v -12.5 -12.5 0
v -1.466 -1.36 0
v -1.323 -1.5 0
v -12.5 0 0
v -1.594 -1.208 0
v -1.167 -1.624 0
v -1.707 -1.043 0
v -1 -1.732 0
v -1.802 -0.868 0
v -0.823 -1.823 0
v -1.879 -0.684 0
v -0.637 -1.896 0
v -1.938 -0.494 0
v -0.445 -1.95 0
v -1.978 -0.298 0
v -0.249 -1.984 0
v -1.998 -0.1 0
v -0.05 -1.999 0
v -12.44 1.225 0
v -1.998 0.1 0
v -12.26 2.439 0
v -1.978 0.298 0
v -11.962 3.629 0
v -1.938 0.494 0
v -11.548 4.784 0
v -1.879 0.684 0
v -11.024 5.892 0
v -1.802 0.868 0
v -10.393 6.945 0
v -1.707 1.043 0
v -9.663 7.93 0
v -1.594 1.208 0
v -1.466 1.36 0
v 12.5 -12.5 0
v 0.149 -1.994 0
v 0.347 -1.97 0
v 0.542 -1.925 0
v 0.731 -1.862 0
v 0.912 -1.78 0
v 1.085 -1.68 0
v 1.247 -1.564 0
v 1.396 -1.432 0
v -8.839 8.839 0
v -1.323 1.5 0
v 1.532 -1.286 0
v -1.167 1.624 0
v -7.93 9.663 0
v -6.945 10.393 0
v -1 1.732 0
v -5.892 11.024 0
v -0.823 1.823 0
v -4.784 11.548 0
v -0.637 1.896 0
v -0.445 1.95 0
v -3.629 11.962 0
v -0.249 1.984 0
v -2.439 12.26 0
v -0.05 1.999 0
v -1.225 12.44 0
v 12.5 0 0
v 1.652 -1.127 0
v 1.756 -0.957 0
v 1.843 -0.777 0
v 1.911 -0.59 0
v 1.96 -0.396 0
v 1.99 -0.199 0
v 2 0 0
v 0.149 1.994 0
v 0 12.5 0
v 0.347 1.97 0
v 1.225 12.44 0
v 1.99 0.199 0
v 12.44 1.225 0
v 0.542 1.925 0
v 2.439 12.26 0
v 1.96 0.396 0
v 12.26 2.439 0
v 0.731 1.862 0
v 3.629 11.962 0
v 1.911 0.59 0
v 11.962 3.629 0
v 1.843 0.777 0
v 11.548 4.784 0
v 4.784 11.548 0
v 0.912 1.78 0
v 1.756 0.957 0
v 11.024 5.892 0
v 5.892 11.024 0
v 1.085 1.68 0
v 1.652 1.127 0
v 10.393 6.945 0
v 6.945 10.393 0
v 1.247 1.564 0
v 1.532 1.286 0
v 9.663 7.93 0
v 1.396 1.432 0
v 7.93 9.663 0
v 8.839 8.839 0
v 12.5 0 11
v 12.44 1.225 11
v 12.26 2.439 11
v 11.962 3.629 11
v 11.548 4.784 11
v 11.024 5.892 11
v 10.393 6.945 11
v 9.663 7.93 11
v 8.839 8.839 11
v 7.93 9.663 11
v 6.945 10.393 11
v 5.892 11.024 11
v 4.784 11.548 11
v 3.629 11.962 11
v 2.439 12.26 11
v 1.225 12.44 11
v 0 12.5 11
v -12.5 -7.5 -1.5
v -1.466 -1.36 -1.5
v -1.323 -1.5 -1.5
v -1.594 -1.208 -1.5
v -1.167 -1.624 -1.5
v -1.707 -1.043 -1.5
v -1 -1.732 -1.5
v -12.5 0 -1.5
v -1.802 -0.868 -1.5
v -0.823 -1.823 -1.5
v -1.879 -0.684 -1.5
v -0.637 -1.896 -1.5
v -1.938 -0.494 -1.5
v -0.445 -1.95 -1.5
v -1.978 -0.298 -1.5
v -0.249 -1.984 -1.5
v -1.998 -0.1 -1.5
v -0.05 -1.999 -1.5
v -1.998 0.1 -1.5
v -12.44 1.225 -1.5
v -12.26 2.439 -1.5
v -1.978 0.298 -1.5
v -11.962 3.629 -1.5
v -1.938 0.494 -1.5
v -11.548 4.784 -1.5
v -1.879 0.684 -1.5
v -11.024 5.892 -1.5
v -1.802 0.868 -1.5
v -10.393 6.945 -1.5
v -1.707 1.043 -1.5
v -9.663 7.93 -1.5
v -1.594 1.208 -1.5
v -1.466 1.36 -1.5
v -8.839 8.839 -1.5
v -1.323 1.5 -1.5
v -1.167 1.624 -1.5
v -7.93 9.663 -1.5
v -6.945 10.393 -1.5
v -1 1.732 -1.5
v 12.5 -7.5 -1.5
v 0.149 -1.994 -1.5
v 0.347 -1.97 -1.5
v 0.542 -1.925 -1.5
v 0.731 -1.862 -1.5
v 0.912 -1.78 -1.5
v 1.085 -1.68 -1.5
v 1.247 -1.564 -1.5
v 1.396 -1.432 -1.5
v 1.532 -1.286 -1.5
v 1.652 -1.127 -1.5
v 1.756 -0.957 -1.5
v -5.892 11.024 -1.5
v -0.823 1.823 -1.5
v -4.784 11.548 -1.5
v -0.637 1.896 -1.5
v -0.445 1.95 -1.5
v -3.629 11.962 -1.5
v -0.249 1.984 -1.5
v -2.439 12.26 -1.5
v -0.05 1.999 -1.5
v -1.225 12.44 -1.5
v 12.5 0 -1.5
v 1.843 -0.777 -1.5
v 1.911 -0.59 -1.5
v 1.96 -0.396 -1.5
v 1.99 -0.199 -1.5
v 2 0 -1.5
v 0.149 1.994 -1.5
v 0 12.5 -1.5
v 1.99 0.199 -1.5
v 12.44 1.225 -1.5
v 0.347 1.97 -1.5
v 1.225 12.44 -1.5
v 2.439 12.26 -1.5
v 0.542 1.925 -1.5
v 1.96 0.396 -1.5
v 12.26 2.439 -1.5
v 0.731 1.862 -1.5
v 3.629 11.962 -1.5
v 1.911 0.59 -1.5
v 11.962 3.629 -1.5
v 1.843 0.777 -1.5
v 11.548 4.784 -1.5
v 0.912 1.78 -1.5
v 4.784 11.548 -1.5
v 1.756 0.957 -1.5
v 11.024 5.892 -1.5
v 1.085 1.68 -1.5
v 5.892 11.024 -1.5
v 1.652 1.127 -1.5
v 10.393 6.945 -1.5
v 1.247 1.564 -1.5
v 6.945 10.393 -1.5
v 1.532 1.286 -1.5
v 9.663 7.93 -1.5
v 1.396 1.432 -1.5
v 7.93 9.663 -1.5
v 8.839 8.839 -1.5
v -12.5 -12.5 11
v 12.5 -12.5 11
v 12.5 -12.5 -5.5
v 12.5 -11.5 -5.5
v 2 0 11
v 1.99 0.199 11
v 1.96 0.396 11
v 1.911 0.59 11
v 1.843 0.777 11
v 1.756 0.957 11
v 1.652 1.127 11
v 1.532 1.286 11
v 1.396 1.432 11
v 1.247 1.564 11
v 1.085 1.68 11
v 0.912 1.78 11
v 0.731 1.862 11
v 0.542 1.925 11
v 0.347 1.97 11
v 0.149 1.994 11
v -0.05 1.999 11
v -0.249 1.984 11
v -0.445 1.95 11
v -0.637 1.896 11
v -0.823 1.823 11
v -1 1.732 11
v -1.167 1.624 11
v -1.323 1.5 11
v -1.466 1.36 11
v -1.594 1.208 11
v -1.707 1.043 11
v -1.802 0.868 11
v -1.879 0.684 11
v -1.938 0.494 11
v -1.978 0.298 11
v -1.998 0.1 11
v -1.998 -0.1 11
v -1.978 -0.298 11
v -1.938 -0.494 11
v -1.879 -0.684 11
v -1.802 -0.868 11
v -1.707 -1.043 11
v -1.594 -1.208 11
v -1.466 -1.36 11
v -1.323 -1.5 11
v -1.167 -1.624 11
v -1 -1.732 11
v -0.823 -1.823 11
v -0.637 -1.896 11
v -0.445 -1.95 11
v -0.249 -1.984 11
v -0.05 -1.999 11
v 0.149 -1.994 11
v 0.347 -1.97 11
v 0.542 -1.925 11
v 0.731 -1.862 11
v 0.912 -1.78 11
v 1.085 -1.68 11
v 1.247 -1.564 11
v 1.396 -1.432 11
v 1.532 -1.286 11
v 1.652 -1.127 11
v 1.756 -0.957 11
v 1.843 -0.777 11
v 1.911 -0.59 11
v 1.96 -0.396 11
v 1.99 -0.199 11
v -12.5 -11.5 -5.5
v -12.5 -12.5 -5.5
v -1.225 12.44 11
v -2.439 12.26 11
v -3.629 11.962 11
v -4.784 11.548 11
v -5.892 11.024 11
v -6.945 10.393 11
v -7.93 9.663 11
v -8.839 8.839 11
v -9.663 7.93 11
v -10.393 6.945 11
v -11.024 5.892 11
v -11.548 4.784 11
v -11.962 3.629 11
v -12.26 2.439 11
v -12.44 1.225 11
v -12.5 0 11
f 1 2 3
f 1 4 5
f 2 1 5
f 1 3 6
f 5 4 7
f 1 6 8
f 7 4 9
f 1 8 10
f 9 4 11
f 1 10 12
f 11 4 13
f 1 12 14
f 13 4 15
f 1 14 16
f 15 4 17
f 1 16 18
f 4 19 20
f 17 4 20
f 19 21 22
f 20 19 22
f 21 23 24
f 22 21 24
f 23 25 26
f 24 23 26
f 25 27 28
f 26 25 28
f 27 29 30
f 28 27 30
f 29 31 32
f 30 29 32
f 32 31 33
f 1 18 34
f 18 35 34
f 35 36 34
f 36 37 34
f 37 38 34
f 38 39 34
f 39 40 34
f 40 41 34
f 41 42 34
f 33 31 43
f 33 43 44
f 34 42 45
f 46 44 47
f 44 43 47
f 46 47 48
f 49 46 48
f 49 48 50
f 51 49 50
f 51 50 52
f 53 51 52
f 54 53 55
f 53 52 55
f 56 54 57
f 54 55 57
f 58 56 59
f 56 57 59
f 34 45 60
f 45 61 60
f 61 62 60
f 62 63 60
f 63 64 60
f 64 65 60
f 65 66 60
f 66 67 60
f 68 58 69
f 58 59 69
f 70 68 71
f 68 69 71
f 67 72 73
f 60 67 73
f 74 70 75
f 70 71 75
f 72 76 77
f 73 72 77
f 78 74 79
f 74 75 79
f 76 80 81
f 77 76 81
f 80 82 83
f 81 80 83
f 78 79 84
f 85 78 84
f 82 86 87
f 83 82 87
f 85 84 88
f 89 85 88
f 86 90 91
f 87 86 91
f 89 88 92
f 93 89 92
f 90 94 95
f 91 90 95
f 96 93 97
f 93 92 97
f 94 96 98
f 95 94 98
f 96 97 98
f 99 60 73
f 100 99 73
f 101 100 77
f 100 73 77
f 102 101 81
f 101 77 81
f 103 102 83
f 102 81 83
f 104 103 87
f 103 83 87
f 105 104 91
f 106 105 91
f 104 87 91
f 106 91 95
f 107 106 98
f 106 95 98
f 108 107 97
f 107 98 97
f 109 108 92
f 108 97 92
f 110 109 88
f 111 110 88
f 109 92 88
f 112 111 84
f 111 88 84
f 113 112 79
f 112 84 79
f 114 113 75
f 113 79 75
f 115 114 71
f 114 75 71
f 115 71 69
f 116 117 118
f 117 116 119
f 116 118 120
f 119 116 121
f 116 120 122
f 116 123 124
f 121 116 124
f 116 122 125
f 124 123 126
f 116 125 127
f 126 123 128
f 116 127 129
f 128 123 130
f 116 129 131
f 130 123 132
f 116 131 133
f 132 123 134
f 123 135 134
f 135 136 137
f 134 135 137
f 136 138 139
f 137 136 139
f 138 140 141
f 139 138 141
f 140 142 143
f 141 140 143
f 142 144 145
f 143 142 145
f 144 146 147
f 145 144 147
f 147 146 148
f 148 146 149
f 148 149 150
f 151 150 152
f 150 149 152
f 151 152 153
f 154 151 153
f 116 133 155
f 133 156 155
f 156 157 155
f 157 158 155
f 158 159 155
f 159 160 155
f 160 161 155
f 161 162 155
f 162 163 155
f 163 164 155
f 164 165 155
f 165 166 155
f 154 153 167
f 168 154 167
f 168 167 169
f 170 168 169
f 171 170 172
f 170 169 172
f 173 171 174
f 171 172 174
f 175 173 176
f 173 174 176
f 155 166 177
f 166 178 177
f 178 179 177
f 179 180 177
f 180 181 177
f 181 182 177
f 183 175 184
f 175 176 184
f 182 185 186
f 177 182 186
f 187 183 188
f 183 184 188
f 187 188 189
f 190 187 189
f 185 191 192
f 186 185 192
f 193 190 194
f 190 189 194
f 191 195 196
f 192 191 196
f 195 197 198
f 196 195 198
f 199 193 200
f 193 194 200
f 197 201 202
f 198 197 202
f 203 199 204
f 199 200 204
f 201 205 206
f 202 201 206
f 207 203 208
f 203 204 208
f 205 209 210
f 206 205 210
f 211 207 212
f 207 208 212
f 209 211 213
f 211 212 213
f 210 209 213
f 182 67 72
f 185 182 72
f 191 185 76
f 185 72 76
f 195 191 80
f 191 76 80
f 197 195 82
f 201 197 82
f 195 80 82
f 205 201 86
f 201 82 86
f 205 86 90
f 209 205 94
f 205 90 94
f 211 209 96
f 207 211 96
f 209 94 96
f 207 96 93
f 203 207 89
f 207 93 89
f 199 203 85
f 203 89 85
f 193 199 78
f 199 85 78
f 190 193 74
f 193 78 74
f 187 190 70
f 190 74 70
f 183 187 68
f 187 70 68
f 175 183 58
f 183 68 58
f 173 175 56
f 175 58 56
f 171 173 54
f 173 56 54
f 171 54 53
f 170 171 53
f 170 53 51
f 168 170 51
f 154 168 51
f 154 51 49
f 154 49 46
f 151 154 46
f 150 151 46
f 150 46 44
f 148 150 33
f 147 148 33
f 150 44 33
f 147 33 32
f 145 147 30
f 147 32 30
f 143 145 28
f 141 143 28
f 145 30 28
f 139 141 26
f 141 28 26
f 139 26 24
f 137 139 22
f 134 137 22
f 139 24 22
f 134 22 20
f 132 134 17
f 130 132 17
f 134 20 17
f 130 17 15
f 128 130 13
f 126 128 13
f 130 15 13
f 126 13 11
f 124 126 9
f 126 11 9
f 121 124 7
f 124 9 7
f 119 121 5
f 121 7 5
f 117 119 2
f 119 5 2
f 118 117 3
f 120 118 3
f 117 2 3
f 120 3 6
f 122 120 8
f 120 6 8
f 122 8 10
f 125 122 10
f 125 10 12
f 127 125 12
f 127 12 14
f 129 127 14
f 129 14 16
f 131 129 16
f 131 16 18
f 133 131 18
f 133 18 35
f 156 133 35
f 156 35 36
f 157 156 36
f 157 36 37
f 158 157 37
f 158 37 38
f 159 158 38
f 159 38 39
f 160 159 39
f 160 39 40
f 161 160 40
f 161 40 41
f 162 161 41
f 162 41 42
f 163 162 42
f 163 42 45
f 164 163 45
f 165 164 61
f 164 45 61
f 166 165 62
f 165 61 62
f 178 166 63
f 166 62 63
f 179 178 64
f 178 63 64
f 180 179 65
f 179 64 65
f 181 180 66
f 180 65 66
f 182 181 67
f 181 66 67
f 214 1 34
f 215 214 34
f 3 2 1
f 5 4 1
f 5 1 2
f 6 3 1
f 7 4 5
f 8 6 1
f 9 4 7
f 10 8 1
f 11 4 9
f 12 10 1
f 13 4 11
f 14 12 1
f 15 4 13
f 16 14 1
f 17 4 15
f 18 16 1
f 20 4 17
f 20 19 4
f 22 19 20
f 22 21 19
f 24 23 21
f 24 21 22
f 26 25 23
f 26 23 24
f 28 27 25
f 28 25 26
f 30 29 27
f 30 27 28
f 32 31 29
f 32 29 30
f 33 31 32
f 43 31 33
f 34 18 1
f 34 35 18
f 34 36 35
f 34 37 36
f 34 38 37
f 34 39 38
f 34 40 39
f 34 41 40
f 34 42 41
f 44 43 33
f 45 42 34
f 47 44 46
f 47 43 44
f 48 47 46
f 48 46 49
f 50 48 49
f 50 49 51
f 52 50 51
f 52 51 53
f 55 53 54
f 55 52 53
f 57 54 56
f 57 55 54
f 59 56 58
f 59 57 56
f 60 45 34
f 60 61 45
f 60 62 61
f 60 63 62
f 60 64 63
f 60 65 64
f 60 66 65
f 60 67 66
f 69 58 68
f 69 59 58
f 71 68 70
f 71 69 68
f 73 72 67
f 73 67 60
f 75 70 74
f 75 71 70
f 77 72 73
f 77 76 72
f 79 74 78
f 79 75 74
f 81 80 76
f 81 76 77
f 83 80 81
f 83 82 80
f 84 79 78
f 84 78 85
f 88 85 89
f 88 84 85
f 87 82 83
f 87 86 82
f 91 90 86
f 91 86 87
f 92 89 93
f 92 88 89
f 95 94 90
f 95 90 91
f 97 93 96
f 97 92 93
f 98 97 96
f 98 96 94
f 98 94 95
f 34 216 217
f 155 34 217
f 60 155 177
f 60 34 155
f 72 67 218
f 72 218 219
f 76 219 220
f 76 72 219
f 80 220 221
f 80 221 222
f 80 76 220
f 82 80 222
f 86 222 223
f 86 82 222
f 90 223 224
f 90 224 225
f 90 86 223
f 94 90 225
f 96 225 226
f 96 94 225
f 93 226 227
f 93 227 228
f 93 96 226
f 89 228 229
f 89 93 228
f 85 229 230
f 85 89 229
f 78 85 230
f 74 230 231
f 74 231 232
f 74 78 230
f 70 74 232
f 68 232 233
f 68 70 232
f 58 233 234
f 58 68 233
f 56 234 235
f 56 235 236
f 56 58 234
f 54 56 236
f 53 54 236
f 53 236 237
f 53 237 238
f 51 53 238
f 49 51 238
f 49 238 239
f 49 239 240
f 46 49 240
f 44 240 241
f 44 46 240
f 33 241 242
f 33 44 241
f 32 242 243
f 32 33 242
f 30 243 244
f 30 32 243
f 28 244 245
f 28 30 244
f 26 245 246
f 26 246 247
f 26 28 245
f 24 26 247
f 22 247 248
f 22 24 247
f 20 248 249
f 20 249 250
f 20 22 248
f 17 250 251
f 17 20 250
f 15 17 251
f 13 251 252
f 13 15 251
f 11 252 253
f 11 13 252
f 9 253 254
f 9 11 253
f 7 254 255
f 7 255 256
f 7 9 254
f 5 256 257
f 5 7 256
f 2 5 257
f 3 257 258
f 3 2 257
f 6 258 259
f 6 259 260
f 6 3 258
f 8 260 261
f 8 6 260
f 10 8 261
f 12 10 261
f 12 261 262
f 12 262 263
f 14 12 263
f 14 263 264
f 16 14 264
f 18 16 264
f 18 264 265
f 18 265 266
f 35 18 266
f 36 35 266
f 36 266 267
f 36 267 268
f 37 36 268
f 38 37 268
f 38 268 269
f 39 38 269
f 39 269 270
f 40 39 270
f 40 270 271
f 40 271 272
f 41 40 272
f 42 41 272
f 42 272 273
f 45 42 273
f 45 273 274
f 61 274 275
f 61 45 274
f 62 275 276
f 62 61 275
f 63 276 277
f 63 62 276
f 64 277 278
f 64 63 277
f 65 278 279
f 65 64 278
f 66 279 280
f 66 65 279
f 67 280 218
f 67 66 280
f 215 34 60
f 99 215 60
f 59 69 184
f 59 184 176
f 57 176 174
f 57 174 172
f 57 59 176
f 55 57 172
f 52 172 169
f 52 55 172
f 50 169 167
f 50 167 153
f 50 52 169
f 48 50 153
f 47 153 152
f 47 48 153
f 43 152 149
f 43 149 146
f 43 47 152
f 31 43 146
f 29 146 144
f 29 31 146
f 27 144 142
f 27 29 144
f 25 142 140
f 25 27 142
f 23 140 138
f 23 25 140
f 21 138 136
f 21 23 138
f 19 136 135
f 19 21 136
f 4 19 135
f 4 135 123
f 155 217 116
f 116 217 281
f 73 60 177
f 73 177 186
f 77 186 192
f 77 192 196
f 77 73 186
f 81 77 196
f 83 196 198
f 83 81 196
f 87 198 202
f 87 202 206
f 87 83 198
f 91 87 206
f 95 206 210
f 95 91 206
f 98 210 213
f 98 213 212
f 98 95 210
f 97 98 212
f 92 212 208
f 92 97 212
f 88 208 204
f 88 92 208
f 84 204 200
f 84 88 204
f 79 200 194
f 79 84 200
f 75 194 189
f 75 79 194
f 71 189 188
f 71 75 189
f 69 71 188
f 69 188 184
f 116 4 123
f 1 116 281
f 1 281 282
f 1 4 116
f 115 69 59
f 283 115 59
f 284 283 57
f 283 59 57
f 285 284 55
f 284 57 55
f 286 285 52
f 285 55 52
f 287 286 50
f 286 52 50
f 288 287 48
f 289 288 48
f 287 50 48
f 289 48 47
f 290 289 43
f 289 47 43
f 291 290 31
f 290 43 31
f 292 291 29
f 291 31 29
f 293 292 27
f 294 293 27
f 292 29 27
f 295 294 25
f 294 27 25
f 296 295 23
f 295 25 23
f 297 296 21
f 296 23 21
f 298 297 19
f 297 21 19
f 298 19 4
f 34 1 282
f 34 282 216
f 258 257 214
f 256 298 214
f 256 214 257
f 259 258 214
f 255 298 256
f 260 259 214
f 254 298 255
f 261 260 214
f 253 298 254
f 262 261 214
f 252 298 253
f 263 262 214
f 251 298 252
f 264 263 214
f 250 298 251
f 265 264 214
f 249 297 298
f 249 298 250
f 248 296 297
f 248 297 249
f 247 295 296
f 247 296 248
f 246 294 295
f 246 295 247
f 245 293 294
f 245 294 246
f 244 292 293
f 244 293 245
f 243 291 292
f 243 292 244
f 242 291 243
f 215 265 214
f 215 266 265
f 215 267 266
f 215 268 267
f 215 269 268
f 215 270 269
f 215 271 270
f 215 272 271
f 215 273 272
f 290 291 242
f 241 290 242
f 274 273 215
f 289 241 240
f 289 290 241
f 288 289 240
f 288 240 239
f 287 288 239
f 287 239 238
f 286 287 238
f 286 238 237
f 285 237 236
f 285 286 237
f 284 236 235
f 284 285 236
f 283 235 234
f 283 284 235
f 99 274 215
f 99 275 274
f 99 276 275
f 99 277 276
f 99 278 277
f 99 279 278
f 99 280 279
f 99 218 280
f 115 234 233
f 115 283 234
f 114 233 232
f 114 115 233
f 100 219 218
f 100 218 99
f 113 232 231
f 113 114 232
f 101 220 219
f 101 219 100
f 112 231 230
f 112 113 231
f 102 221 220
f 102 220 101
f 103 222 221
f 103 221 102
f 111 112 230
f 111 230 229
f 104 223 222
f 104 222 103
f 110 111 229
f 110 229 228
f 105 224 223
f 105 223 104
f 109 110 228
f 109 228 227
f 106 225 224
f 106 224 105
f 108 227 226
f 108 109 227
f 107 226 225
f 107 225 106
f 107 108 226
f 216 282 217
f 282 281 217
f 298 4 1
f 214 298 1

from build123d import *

# Parameters (mm, degrees)
F1_R     = 2
F2_DEPTH = 11
F3_DEPTH = 1.5
F5_DEPTH = 5.5
F6_SIZE  = 3.99999


# Not quite as in the source:
# - a fillet or chamfer is up to 0.001 mm smaller than in the source, because OpenCascade refuses the exact size


with BuildPart() as f2:
    # F1 (on Top) → F2 (new body)
    with BuildSketch(Plane.XY):
        with BuildLine():
            ThreePointArc((-4.8989794856, -11.5), (-10.4280209908, -6.8924870849), (-12.5, 0))
            Line((-12.5, 0), (-12.5, -11.5))
            Line((-12.5, -11.5), (-4.8989794856, -11.5))
        make_face()
        with BuildLine():
            ThreePointArc((4.8989794856, -11.5), (10.4280209908, -6.8924870849), (12.5, 0))
            ThreePointArc((12.5, 0), (8.8388347648, 8.8388347648), (0, 12.5))
            ThreePointArc((0, 12.5), (-8.8388347648, 8.8388347648), (-12.5, 0))
            ThreePointArc((-12.5, 0), (-10.4280209908, -6.8924870849), (-4.8989794856, -11.5))
            Line((-4.8989794856, -11.5), (4.8989794856, -11.5))
        make_face()
        Circle(F1_R, mode=Mode.SUBTRACT)
        with BuildLine():
            Line((12.5, -11.5), (12.5, 0))
            ThreePointArc((12.5, 0), (10.4280209908, -6.8924870849), (4.8989794856, -11.5))
            Line((4.8989794856, -11.5), (12.5, -11.5))
        make_face()
        with BuildLine():
            Line((-12.5, -12.5), (0, -12.5))
            ThreePointArc((0, -12.5), (-2.5, -12.2474487139), (-4.8989794856, -11.5))
            Line((-4.8989794856, -11.5), (-12.5, -11.5))
            Line((-12.5, -11.5), (-12.5, -12.5))
        make_face()
        with BuildLine():
            ThreePointArc((0, -12.5), (2.5, -12.2474487139), (4.8989794856, -11.5))
            Line((4.8989794856, -11.5), (-4.8989794856, -11.5))
            ThreePointArc((-4.8989794856, -11.5), (-2.5, -12.2474487139), (0, -12.5))
        make_face()
        with BuildLine():
            Line((12.5, -11.5), (4.8989794856, -11.5))
            ThreePointArc((4.8989794856, -11.5), (2.5, -12.2474487139), (0, -12.5))
            Line((0, -12.5), (12.5, -12.5))
            Line((12.5, -12.5), (12.5, -11.5))
        make_face()
    extrude(amount=F2_DEPTH)


with BuildPart() as f3:
    # F1 (on Top) → F3 (new body)
    with BuildSketch(Plane.XY):
        with BuildLine():
            Line((-12.5, -12.5), (0, -12.5))
            ThreePointArc((0, -12.5), (-2.5, -12.2474487139), (-4.8989794856, -11.5))
            Line((-4.8989794856, -11.5), (-12.5, -11.5))
            Line((-12.5, -11.5), (-12.5, -12.5))
        make_face()
        with BuildLine():
            ThreePointArc((0, -12.5), (2.5, -12.2474487139), (4.8989794856, -11.5))
            Line((4.8989794856, -11.5), (-4.8989794856, -11.5))
            ThreePointArc((-4.8989794856, -11.5), (-2.5, -12.2474487139), (0, -12.5))
        make_face()
        with BuildLine():
            Line((12.5, -11.5), (4.8989794856, -11.5))
            ThreePointArc((4.8989794856, -11.5), (2.5, -12.2474487139), (0, -12.5))
            Line((0, -12.5), (12.5, -12.5))
            Line((12.5, -12.5), (12.5, -11.5))
        make_face()
        with BuildLine():
            Line((12.5, -11.5), (12.5, 0))
            ThreePointArc((12.5, 0), (10.4280209908, -6.8924870849), (4.8989794856, -11.5))
            Line((4.8989794856, -11.5), (12.5, -11.5))
        make_face()
        with BuildLine():
            ThreePointArc((4.8989794856, -11.5), (10.4280209908, -6.8924870849), (12.5, 0))
            ThreePointArc((12.5, 0), (8.8388347648, 8.8388347648), (0, 12.5))
            ThreePointArc((0, 12.5), (-8.8388347648, 8.8388347648), (-12.5, 0))
            ThreePointArc((-12.5, 0), (-10.4280209908, -6.8924870849), (-4.8989794856, -11.5))
            Line((-4.8989794856, -11.5), (4.8989794856, -11.5))
        make_face()
        Circle(F1_R, mode=Mode.SUBTRACT)
        with BuildLine():
            ThreePointArc((-4.8989794856, -11.5), (-10.4280209908, -6.8924870849), (-12.5, 0))
            Line((-12.5, 0), (-12.5, -11.5))
            Line((-12.5, -11.5), (-4.8989794856, -11.5))
        make_face()
    extrude(amount=-F3_DEPTH)

    # F1 (on Top) → F5 (join)
    with BuildSketch(Plane.XY):
        with BuildLine():
            Line((-12.5, -12.5), (0, -12.5))
            ThreePointArc((0, -12.5), (-2.5, -12.2474487139), (-4.8989794856, -11.5))
            Line((-4.8989794856, -11.5), (-12.5, -11.5))
            Line((-12.5, -11.5), (-12.5, -12.5))
        make_face()
        with BuildLine():
            ThreePointArc((0, -12.5), (2.5, -12.2474487139), (4.8989794856, -11.5))
            Line((4.8989794856, -11.5), (-4.8989794856, -11.5))
            ThreePointArc((-4.8989794856, -11.5), (-2.5, -12.2474487139), (0, -12.5))
        make_face()
        with BuildLine():
            Line((12.5, -11.5), (4.8989794856, -11.5))
            ThreePointArc((4.8989794856, -11.5), (2.5, -12.2474487139), (0, -12.5))
            Line((0, -12.5), (12.5, -12.5))
            Line((12.5, -12.5), (12.5, -11.5))
        make_face()
    extrude(amount=-F5_DEPTH)

    # F6 (size 4 in the source; OpenCascade refuses exactly that, so slightly less here)
    f6_edges = [f3.edges().sort_by_distance(p)[0] for p in [
        (0, -11.5, -1.5),
    ]]
    chamfer(f6_edges, length=F6_SIZE)


solid = Compound([f2.part, f3.part])
